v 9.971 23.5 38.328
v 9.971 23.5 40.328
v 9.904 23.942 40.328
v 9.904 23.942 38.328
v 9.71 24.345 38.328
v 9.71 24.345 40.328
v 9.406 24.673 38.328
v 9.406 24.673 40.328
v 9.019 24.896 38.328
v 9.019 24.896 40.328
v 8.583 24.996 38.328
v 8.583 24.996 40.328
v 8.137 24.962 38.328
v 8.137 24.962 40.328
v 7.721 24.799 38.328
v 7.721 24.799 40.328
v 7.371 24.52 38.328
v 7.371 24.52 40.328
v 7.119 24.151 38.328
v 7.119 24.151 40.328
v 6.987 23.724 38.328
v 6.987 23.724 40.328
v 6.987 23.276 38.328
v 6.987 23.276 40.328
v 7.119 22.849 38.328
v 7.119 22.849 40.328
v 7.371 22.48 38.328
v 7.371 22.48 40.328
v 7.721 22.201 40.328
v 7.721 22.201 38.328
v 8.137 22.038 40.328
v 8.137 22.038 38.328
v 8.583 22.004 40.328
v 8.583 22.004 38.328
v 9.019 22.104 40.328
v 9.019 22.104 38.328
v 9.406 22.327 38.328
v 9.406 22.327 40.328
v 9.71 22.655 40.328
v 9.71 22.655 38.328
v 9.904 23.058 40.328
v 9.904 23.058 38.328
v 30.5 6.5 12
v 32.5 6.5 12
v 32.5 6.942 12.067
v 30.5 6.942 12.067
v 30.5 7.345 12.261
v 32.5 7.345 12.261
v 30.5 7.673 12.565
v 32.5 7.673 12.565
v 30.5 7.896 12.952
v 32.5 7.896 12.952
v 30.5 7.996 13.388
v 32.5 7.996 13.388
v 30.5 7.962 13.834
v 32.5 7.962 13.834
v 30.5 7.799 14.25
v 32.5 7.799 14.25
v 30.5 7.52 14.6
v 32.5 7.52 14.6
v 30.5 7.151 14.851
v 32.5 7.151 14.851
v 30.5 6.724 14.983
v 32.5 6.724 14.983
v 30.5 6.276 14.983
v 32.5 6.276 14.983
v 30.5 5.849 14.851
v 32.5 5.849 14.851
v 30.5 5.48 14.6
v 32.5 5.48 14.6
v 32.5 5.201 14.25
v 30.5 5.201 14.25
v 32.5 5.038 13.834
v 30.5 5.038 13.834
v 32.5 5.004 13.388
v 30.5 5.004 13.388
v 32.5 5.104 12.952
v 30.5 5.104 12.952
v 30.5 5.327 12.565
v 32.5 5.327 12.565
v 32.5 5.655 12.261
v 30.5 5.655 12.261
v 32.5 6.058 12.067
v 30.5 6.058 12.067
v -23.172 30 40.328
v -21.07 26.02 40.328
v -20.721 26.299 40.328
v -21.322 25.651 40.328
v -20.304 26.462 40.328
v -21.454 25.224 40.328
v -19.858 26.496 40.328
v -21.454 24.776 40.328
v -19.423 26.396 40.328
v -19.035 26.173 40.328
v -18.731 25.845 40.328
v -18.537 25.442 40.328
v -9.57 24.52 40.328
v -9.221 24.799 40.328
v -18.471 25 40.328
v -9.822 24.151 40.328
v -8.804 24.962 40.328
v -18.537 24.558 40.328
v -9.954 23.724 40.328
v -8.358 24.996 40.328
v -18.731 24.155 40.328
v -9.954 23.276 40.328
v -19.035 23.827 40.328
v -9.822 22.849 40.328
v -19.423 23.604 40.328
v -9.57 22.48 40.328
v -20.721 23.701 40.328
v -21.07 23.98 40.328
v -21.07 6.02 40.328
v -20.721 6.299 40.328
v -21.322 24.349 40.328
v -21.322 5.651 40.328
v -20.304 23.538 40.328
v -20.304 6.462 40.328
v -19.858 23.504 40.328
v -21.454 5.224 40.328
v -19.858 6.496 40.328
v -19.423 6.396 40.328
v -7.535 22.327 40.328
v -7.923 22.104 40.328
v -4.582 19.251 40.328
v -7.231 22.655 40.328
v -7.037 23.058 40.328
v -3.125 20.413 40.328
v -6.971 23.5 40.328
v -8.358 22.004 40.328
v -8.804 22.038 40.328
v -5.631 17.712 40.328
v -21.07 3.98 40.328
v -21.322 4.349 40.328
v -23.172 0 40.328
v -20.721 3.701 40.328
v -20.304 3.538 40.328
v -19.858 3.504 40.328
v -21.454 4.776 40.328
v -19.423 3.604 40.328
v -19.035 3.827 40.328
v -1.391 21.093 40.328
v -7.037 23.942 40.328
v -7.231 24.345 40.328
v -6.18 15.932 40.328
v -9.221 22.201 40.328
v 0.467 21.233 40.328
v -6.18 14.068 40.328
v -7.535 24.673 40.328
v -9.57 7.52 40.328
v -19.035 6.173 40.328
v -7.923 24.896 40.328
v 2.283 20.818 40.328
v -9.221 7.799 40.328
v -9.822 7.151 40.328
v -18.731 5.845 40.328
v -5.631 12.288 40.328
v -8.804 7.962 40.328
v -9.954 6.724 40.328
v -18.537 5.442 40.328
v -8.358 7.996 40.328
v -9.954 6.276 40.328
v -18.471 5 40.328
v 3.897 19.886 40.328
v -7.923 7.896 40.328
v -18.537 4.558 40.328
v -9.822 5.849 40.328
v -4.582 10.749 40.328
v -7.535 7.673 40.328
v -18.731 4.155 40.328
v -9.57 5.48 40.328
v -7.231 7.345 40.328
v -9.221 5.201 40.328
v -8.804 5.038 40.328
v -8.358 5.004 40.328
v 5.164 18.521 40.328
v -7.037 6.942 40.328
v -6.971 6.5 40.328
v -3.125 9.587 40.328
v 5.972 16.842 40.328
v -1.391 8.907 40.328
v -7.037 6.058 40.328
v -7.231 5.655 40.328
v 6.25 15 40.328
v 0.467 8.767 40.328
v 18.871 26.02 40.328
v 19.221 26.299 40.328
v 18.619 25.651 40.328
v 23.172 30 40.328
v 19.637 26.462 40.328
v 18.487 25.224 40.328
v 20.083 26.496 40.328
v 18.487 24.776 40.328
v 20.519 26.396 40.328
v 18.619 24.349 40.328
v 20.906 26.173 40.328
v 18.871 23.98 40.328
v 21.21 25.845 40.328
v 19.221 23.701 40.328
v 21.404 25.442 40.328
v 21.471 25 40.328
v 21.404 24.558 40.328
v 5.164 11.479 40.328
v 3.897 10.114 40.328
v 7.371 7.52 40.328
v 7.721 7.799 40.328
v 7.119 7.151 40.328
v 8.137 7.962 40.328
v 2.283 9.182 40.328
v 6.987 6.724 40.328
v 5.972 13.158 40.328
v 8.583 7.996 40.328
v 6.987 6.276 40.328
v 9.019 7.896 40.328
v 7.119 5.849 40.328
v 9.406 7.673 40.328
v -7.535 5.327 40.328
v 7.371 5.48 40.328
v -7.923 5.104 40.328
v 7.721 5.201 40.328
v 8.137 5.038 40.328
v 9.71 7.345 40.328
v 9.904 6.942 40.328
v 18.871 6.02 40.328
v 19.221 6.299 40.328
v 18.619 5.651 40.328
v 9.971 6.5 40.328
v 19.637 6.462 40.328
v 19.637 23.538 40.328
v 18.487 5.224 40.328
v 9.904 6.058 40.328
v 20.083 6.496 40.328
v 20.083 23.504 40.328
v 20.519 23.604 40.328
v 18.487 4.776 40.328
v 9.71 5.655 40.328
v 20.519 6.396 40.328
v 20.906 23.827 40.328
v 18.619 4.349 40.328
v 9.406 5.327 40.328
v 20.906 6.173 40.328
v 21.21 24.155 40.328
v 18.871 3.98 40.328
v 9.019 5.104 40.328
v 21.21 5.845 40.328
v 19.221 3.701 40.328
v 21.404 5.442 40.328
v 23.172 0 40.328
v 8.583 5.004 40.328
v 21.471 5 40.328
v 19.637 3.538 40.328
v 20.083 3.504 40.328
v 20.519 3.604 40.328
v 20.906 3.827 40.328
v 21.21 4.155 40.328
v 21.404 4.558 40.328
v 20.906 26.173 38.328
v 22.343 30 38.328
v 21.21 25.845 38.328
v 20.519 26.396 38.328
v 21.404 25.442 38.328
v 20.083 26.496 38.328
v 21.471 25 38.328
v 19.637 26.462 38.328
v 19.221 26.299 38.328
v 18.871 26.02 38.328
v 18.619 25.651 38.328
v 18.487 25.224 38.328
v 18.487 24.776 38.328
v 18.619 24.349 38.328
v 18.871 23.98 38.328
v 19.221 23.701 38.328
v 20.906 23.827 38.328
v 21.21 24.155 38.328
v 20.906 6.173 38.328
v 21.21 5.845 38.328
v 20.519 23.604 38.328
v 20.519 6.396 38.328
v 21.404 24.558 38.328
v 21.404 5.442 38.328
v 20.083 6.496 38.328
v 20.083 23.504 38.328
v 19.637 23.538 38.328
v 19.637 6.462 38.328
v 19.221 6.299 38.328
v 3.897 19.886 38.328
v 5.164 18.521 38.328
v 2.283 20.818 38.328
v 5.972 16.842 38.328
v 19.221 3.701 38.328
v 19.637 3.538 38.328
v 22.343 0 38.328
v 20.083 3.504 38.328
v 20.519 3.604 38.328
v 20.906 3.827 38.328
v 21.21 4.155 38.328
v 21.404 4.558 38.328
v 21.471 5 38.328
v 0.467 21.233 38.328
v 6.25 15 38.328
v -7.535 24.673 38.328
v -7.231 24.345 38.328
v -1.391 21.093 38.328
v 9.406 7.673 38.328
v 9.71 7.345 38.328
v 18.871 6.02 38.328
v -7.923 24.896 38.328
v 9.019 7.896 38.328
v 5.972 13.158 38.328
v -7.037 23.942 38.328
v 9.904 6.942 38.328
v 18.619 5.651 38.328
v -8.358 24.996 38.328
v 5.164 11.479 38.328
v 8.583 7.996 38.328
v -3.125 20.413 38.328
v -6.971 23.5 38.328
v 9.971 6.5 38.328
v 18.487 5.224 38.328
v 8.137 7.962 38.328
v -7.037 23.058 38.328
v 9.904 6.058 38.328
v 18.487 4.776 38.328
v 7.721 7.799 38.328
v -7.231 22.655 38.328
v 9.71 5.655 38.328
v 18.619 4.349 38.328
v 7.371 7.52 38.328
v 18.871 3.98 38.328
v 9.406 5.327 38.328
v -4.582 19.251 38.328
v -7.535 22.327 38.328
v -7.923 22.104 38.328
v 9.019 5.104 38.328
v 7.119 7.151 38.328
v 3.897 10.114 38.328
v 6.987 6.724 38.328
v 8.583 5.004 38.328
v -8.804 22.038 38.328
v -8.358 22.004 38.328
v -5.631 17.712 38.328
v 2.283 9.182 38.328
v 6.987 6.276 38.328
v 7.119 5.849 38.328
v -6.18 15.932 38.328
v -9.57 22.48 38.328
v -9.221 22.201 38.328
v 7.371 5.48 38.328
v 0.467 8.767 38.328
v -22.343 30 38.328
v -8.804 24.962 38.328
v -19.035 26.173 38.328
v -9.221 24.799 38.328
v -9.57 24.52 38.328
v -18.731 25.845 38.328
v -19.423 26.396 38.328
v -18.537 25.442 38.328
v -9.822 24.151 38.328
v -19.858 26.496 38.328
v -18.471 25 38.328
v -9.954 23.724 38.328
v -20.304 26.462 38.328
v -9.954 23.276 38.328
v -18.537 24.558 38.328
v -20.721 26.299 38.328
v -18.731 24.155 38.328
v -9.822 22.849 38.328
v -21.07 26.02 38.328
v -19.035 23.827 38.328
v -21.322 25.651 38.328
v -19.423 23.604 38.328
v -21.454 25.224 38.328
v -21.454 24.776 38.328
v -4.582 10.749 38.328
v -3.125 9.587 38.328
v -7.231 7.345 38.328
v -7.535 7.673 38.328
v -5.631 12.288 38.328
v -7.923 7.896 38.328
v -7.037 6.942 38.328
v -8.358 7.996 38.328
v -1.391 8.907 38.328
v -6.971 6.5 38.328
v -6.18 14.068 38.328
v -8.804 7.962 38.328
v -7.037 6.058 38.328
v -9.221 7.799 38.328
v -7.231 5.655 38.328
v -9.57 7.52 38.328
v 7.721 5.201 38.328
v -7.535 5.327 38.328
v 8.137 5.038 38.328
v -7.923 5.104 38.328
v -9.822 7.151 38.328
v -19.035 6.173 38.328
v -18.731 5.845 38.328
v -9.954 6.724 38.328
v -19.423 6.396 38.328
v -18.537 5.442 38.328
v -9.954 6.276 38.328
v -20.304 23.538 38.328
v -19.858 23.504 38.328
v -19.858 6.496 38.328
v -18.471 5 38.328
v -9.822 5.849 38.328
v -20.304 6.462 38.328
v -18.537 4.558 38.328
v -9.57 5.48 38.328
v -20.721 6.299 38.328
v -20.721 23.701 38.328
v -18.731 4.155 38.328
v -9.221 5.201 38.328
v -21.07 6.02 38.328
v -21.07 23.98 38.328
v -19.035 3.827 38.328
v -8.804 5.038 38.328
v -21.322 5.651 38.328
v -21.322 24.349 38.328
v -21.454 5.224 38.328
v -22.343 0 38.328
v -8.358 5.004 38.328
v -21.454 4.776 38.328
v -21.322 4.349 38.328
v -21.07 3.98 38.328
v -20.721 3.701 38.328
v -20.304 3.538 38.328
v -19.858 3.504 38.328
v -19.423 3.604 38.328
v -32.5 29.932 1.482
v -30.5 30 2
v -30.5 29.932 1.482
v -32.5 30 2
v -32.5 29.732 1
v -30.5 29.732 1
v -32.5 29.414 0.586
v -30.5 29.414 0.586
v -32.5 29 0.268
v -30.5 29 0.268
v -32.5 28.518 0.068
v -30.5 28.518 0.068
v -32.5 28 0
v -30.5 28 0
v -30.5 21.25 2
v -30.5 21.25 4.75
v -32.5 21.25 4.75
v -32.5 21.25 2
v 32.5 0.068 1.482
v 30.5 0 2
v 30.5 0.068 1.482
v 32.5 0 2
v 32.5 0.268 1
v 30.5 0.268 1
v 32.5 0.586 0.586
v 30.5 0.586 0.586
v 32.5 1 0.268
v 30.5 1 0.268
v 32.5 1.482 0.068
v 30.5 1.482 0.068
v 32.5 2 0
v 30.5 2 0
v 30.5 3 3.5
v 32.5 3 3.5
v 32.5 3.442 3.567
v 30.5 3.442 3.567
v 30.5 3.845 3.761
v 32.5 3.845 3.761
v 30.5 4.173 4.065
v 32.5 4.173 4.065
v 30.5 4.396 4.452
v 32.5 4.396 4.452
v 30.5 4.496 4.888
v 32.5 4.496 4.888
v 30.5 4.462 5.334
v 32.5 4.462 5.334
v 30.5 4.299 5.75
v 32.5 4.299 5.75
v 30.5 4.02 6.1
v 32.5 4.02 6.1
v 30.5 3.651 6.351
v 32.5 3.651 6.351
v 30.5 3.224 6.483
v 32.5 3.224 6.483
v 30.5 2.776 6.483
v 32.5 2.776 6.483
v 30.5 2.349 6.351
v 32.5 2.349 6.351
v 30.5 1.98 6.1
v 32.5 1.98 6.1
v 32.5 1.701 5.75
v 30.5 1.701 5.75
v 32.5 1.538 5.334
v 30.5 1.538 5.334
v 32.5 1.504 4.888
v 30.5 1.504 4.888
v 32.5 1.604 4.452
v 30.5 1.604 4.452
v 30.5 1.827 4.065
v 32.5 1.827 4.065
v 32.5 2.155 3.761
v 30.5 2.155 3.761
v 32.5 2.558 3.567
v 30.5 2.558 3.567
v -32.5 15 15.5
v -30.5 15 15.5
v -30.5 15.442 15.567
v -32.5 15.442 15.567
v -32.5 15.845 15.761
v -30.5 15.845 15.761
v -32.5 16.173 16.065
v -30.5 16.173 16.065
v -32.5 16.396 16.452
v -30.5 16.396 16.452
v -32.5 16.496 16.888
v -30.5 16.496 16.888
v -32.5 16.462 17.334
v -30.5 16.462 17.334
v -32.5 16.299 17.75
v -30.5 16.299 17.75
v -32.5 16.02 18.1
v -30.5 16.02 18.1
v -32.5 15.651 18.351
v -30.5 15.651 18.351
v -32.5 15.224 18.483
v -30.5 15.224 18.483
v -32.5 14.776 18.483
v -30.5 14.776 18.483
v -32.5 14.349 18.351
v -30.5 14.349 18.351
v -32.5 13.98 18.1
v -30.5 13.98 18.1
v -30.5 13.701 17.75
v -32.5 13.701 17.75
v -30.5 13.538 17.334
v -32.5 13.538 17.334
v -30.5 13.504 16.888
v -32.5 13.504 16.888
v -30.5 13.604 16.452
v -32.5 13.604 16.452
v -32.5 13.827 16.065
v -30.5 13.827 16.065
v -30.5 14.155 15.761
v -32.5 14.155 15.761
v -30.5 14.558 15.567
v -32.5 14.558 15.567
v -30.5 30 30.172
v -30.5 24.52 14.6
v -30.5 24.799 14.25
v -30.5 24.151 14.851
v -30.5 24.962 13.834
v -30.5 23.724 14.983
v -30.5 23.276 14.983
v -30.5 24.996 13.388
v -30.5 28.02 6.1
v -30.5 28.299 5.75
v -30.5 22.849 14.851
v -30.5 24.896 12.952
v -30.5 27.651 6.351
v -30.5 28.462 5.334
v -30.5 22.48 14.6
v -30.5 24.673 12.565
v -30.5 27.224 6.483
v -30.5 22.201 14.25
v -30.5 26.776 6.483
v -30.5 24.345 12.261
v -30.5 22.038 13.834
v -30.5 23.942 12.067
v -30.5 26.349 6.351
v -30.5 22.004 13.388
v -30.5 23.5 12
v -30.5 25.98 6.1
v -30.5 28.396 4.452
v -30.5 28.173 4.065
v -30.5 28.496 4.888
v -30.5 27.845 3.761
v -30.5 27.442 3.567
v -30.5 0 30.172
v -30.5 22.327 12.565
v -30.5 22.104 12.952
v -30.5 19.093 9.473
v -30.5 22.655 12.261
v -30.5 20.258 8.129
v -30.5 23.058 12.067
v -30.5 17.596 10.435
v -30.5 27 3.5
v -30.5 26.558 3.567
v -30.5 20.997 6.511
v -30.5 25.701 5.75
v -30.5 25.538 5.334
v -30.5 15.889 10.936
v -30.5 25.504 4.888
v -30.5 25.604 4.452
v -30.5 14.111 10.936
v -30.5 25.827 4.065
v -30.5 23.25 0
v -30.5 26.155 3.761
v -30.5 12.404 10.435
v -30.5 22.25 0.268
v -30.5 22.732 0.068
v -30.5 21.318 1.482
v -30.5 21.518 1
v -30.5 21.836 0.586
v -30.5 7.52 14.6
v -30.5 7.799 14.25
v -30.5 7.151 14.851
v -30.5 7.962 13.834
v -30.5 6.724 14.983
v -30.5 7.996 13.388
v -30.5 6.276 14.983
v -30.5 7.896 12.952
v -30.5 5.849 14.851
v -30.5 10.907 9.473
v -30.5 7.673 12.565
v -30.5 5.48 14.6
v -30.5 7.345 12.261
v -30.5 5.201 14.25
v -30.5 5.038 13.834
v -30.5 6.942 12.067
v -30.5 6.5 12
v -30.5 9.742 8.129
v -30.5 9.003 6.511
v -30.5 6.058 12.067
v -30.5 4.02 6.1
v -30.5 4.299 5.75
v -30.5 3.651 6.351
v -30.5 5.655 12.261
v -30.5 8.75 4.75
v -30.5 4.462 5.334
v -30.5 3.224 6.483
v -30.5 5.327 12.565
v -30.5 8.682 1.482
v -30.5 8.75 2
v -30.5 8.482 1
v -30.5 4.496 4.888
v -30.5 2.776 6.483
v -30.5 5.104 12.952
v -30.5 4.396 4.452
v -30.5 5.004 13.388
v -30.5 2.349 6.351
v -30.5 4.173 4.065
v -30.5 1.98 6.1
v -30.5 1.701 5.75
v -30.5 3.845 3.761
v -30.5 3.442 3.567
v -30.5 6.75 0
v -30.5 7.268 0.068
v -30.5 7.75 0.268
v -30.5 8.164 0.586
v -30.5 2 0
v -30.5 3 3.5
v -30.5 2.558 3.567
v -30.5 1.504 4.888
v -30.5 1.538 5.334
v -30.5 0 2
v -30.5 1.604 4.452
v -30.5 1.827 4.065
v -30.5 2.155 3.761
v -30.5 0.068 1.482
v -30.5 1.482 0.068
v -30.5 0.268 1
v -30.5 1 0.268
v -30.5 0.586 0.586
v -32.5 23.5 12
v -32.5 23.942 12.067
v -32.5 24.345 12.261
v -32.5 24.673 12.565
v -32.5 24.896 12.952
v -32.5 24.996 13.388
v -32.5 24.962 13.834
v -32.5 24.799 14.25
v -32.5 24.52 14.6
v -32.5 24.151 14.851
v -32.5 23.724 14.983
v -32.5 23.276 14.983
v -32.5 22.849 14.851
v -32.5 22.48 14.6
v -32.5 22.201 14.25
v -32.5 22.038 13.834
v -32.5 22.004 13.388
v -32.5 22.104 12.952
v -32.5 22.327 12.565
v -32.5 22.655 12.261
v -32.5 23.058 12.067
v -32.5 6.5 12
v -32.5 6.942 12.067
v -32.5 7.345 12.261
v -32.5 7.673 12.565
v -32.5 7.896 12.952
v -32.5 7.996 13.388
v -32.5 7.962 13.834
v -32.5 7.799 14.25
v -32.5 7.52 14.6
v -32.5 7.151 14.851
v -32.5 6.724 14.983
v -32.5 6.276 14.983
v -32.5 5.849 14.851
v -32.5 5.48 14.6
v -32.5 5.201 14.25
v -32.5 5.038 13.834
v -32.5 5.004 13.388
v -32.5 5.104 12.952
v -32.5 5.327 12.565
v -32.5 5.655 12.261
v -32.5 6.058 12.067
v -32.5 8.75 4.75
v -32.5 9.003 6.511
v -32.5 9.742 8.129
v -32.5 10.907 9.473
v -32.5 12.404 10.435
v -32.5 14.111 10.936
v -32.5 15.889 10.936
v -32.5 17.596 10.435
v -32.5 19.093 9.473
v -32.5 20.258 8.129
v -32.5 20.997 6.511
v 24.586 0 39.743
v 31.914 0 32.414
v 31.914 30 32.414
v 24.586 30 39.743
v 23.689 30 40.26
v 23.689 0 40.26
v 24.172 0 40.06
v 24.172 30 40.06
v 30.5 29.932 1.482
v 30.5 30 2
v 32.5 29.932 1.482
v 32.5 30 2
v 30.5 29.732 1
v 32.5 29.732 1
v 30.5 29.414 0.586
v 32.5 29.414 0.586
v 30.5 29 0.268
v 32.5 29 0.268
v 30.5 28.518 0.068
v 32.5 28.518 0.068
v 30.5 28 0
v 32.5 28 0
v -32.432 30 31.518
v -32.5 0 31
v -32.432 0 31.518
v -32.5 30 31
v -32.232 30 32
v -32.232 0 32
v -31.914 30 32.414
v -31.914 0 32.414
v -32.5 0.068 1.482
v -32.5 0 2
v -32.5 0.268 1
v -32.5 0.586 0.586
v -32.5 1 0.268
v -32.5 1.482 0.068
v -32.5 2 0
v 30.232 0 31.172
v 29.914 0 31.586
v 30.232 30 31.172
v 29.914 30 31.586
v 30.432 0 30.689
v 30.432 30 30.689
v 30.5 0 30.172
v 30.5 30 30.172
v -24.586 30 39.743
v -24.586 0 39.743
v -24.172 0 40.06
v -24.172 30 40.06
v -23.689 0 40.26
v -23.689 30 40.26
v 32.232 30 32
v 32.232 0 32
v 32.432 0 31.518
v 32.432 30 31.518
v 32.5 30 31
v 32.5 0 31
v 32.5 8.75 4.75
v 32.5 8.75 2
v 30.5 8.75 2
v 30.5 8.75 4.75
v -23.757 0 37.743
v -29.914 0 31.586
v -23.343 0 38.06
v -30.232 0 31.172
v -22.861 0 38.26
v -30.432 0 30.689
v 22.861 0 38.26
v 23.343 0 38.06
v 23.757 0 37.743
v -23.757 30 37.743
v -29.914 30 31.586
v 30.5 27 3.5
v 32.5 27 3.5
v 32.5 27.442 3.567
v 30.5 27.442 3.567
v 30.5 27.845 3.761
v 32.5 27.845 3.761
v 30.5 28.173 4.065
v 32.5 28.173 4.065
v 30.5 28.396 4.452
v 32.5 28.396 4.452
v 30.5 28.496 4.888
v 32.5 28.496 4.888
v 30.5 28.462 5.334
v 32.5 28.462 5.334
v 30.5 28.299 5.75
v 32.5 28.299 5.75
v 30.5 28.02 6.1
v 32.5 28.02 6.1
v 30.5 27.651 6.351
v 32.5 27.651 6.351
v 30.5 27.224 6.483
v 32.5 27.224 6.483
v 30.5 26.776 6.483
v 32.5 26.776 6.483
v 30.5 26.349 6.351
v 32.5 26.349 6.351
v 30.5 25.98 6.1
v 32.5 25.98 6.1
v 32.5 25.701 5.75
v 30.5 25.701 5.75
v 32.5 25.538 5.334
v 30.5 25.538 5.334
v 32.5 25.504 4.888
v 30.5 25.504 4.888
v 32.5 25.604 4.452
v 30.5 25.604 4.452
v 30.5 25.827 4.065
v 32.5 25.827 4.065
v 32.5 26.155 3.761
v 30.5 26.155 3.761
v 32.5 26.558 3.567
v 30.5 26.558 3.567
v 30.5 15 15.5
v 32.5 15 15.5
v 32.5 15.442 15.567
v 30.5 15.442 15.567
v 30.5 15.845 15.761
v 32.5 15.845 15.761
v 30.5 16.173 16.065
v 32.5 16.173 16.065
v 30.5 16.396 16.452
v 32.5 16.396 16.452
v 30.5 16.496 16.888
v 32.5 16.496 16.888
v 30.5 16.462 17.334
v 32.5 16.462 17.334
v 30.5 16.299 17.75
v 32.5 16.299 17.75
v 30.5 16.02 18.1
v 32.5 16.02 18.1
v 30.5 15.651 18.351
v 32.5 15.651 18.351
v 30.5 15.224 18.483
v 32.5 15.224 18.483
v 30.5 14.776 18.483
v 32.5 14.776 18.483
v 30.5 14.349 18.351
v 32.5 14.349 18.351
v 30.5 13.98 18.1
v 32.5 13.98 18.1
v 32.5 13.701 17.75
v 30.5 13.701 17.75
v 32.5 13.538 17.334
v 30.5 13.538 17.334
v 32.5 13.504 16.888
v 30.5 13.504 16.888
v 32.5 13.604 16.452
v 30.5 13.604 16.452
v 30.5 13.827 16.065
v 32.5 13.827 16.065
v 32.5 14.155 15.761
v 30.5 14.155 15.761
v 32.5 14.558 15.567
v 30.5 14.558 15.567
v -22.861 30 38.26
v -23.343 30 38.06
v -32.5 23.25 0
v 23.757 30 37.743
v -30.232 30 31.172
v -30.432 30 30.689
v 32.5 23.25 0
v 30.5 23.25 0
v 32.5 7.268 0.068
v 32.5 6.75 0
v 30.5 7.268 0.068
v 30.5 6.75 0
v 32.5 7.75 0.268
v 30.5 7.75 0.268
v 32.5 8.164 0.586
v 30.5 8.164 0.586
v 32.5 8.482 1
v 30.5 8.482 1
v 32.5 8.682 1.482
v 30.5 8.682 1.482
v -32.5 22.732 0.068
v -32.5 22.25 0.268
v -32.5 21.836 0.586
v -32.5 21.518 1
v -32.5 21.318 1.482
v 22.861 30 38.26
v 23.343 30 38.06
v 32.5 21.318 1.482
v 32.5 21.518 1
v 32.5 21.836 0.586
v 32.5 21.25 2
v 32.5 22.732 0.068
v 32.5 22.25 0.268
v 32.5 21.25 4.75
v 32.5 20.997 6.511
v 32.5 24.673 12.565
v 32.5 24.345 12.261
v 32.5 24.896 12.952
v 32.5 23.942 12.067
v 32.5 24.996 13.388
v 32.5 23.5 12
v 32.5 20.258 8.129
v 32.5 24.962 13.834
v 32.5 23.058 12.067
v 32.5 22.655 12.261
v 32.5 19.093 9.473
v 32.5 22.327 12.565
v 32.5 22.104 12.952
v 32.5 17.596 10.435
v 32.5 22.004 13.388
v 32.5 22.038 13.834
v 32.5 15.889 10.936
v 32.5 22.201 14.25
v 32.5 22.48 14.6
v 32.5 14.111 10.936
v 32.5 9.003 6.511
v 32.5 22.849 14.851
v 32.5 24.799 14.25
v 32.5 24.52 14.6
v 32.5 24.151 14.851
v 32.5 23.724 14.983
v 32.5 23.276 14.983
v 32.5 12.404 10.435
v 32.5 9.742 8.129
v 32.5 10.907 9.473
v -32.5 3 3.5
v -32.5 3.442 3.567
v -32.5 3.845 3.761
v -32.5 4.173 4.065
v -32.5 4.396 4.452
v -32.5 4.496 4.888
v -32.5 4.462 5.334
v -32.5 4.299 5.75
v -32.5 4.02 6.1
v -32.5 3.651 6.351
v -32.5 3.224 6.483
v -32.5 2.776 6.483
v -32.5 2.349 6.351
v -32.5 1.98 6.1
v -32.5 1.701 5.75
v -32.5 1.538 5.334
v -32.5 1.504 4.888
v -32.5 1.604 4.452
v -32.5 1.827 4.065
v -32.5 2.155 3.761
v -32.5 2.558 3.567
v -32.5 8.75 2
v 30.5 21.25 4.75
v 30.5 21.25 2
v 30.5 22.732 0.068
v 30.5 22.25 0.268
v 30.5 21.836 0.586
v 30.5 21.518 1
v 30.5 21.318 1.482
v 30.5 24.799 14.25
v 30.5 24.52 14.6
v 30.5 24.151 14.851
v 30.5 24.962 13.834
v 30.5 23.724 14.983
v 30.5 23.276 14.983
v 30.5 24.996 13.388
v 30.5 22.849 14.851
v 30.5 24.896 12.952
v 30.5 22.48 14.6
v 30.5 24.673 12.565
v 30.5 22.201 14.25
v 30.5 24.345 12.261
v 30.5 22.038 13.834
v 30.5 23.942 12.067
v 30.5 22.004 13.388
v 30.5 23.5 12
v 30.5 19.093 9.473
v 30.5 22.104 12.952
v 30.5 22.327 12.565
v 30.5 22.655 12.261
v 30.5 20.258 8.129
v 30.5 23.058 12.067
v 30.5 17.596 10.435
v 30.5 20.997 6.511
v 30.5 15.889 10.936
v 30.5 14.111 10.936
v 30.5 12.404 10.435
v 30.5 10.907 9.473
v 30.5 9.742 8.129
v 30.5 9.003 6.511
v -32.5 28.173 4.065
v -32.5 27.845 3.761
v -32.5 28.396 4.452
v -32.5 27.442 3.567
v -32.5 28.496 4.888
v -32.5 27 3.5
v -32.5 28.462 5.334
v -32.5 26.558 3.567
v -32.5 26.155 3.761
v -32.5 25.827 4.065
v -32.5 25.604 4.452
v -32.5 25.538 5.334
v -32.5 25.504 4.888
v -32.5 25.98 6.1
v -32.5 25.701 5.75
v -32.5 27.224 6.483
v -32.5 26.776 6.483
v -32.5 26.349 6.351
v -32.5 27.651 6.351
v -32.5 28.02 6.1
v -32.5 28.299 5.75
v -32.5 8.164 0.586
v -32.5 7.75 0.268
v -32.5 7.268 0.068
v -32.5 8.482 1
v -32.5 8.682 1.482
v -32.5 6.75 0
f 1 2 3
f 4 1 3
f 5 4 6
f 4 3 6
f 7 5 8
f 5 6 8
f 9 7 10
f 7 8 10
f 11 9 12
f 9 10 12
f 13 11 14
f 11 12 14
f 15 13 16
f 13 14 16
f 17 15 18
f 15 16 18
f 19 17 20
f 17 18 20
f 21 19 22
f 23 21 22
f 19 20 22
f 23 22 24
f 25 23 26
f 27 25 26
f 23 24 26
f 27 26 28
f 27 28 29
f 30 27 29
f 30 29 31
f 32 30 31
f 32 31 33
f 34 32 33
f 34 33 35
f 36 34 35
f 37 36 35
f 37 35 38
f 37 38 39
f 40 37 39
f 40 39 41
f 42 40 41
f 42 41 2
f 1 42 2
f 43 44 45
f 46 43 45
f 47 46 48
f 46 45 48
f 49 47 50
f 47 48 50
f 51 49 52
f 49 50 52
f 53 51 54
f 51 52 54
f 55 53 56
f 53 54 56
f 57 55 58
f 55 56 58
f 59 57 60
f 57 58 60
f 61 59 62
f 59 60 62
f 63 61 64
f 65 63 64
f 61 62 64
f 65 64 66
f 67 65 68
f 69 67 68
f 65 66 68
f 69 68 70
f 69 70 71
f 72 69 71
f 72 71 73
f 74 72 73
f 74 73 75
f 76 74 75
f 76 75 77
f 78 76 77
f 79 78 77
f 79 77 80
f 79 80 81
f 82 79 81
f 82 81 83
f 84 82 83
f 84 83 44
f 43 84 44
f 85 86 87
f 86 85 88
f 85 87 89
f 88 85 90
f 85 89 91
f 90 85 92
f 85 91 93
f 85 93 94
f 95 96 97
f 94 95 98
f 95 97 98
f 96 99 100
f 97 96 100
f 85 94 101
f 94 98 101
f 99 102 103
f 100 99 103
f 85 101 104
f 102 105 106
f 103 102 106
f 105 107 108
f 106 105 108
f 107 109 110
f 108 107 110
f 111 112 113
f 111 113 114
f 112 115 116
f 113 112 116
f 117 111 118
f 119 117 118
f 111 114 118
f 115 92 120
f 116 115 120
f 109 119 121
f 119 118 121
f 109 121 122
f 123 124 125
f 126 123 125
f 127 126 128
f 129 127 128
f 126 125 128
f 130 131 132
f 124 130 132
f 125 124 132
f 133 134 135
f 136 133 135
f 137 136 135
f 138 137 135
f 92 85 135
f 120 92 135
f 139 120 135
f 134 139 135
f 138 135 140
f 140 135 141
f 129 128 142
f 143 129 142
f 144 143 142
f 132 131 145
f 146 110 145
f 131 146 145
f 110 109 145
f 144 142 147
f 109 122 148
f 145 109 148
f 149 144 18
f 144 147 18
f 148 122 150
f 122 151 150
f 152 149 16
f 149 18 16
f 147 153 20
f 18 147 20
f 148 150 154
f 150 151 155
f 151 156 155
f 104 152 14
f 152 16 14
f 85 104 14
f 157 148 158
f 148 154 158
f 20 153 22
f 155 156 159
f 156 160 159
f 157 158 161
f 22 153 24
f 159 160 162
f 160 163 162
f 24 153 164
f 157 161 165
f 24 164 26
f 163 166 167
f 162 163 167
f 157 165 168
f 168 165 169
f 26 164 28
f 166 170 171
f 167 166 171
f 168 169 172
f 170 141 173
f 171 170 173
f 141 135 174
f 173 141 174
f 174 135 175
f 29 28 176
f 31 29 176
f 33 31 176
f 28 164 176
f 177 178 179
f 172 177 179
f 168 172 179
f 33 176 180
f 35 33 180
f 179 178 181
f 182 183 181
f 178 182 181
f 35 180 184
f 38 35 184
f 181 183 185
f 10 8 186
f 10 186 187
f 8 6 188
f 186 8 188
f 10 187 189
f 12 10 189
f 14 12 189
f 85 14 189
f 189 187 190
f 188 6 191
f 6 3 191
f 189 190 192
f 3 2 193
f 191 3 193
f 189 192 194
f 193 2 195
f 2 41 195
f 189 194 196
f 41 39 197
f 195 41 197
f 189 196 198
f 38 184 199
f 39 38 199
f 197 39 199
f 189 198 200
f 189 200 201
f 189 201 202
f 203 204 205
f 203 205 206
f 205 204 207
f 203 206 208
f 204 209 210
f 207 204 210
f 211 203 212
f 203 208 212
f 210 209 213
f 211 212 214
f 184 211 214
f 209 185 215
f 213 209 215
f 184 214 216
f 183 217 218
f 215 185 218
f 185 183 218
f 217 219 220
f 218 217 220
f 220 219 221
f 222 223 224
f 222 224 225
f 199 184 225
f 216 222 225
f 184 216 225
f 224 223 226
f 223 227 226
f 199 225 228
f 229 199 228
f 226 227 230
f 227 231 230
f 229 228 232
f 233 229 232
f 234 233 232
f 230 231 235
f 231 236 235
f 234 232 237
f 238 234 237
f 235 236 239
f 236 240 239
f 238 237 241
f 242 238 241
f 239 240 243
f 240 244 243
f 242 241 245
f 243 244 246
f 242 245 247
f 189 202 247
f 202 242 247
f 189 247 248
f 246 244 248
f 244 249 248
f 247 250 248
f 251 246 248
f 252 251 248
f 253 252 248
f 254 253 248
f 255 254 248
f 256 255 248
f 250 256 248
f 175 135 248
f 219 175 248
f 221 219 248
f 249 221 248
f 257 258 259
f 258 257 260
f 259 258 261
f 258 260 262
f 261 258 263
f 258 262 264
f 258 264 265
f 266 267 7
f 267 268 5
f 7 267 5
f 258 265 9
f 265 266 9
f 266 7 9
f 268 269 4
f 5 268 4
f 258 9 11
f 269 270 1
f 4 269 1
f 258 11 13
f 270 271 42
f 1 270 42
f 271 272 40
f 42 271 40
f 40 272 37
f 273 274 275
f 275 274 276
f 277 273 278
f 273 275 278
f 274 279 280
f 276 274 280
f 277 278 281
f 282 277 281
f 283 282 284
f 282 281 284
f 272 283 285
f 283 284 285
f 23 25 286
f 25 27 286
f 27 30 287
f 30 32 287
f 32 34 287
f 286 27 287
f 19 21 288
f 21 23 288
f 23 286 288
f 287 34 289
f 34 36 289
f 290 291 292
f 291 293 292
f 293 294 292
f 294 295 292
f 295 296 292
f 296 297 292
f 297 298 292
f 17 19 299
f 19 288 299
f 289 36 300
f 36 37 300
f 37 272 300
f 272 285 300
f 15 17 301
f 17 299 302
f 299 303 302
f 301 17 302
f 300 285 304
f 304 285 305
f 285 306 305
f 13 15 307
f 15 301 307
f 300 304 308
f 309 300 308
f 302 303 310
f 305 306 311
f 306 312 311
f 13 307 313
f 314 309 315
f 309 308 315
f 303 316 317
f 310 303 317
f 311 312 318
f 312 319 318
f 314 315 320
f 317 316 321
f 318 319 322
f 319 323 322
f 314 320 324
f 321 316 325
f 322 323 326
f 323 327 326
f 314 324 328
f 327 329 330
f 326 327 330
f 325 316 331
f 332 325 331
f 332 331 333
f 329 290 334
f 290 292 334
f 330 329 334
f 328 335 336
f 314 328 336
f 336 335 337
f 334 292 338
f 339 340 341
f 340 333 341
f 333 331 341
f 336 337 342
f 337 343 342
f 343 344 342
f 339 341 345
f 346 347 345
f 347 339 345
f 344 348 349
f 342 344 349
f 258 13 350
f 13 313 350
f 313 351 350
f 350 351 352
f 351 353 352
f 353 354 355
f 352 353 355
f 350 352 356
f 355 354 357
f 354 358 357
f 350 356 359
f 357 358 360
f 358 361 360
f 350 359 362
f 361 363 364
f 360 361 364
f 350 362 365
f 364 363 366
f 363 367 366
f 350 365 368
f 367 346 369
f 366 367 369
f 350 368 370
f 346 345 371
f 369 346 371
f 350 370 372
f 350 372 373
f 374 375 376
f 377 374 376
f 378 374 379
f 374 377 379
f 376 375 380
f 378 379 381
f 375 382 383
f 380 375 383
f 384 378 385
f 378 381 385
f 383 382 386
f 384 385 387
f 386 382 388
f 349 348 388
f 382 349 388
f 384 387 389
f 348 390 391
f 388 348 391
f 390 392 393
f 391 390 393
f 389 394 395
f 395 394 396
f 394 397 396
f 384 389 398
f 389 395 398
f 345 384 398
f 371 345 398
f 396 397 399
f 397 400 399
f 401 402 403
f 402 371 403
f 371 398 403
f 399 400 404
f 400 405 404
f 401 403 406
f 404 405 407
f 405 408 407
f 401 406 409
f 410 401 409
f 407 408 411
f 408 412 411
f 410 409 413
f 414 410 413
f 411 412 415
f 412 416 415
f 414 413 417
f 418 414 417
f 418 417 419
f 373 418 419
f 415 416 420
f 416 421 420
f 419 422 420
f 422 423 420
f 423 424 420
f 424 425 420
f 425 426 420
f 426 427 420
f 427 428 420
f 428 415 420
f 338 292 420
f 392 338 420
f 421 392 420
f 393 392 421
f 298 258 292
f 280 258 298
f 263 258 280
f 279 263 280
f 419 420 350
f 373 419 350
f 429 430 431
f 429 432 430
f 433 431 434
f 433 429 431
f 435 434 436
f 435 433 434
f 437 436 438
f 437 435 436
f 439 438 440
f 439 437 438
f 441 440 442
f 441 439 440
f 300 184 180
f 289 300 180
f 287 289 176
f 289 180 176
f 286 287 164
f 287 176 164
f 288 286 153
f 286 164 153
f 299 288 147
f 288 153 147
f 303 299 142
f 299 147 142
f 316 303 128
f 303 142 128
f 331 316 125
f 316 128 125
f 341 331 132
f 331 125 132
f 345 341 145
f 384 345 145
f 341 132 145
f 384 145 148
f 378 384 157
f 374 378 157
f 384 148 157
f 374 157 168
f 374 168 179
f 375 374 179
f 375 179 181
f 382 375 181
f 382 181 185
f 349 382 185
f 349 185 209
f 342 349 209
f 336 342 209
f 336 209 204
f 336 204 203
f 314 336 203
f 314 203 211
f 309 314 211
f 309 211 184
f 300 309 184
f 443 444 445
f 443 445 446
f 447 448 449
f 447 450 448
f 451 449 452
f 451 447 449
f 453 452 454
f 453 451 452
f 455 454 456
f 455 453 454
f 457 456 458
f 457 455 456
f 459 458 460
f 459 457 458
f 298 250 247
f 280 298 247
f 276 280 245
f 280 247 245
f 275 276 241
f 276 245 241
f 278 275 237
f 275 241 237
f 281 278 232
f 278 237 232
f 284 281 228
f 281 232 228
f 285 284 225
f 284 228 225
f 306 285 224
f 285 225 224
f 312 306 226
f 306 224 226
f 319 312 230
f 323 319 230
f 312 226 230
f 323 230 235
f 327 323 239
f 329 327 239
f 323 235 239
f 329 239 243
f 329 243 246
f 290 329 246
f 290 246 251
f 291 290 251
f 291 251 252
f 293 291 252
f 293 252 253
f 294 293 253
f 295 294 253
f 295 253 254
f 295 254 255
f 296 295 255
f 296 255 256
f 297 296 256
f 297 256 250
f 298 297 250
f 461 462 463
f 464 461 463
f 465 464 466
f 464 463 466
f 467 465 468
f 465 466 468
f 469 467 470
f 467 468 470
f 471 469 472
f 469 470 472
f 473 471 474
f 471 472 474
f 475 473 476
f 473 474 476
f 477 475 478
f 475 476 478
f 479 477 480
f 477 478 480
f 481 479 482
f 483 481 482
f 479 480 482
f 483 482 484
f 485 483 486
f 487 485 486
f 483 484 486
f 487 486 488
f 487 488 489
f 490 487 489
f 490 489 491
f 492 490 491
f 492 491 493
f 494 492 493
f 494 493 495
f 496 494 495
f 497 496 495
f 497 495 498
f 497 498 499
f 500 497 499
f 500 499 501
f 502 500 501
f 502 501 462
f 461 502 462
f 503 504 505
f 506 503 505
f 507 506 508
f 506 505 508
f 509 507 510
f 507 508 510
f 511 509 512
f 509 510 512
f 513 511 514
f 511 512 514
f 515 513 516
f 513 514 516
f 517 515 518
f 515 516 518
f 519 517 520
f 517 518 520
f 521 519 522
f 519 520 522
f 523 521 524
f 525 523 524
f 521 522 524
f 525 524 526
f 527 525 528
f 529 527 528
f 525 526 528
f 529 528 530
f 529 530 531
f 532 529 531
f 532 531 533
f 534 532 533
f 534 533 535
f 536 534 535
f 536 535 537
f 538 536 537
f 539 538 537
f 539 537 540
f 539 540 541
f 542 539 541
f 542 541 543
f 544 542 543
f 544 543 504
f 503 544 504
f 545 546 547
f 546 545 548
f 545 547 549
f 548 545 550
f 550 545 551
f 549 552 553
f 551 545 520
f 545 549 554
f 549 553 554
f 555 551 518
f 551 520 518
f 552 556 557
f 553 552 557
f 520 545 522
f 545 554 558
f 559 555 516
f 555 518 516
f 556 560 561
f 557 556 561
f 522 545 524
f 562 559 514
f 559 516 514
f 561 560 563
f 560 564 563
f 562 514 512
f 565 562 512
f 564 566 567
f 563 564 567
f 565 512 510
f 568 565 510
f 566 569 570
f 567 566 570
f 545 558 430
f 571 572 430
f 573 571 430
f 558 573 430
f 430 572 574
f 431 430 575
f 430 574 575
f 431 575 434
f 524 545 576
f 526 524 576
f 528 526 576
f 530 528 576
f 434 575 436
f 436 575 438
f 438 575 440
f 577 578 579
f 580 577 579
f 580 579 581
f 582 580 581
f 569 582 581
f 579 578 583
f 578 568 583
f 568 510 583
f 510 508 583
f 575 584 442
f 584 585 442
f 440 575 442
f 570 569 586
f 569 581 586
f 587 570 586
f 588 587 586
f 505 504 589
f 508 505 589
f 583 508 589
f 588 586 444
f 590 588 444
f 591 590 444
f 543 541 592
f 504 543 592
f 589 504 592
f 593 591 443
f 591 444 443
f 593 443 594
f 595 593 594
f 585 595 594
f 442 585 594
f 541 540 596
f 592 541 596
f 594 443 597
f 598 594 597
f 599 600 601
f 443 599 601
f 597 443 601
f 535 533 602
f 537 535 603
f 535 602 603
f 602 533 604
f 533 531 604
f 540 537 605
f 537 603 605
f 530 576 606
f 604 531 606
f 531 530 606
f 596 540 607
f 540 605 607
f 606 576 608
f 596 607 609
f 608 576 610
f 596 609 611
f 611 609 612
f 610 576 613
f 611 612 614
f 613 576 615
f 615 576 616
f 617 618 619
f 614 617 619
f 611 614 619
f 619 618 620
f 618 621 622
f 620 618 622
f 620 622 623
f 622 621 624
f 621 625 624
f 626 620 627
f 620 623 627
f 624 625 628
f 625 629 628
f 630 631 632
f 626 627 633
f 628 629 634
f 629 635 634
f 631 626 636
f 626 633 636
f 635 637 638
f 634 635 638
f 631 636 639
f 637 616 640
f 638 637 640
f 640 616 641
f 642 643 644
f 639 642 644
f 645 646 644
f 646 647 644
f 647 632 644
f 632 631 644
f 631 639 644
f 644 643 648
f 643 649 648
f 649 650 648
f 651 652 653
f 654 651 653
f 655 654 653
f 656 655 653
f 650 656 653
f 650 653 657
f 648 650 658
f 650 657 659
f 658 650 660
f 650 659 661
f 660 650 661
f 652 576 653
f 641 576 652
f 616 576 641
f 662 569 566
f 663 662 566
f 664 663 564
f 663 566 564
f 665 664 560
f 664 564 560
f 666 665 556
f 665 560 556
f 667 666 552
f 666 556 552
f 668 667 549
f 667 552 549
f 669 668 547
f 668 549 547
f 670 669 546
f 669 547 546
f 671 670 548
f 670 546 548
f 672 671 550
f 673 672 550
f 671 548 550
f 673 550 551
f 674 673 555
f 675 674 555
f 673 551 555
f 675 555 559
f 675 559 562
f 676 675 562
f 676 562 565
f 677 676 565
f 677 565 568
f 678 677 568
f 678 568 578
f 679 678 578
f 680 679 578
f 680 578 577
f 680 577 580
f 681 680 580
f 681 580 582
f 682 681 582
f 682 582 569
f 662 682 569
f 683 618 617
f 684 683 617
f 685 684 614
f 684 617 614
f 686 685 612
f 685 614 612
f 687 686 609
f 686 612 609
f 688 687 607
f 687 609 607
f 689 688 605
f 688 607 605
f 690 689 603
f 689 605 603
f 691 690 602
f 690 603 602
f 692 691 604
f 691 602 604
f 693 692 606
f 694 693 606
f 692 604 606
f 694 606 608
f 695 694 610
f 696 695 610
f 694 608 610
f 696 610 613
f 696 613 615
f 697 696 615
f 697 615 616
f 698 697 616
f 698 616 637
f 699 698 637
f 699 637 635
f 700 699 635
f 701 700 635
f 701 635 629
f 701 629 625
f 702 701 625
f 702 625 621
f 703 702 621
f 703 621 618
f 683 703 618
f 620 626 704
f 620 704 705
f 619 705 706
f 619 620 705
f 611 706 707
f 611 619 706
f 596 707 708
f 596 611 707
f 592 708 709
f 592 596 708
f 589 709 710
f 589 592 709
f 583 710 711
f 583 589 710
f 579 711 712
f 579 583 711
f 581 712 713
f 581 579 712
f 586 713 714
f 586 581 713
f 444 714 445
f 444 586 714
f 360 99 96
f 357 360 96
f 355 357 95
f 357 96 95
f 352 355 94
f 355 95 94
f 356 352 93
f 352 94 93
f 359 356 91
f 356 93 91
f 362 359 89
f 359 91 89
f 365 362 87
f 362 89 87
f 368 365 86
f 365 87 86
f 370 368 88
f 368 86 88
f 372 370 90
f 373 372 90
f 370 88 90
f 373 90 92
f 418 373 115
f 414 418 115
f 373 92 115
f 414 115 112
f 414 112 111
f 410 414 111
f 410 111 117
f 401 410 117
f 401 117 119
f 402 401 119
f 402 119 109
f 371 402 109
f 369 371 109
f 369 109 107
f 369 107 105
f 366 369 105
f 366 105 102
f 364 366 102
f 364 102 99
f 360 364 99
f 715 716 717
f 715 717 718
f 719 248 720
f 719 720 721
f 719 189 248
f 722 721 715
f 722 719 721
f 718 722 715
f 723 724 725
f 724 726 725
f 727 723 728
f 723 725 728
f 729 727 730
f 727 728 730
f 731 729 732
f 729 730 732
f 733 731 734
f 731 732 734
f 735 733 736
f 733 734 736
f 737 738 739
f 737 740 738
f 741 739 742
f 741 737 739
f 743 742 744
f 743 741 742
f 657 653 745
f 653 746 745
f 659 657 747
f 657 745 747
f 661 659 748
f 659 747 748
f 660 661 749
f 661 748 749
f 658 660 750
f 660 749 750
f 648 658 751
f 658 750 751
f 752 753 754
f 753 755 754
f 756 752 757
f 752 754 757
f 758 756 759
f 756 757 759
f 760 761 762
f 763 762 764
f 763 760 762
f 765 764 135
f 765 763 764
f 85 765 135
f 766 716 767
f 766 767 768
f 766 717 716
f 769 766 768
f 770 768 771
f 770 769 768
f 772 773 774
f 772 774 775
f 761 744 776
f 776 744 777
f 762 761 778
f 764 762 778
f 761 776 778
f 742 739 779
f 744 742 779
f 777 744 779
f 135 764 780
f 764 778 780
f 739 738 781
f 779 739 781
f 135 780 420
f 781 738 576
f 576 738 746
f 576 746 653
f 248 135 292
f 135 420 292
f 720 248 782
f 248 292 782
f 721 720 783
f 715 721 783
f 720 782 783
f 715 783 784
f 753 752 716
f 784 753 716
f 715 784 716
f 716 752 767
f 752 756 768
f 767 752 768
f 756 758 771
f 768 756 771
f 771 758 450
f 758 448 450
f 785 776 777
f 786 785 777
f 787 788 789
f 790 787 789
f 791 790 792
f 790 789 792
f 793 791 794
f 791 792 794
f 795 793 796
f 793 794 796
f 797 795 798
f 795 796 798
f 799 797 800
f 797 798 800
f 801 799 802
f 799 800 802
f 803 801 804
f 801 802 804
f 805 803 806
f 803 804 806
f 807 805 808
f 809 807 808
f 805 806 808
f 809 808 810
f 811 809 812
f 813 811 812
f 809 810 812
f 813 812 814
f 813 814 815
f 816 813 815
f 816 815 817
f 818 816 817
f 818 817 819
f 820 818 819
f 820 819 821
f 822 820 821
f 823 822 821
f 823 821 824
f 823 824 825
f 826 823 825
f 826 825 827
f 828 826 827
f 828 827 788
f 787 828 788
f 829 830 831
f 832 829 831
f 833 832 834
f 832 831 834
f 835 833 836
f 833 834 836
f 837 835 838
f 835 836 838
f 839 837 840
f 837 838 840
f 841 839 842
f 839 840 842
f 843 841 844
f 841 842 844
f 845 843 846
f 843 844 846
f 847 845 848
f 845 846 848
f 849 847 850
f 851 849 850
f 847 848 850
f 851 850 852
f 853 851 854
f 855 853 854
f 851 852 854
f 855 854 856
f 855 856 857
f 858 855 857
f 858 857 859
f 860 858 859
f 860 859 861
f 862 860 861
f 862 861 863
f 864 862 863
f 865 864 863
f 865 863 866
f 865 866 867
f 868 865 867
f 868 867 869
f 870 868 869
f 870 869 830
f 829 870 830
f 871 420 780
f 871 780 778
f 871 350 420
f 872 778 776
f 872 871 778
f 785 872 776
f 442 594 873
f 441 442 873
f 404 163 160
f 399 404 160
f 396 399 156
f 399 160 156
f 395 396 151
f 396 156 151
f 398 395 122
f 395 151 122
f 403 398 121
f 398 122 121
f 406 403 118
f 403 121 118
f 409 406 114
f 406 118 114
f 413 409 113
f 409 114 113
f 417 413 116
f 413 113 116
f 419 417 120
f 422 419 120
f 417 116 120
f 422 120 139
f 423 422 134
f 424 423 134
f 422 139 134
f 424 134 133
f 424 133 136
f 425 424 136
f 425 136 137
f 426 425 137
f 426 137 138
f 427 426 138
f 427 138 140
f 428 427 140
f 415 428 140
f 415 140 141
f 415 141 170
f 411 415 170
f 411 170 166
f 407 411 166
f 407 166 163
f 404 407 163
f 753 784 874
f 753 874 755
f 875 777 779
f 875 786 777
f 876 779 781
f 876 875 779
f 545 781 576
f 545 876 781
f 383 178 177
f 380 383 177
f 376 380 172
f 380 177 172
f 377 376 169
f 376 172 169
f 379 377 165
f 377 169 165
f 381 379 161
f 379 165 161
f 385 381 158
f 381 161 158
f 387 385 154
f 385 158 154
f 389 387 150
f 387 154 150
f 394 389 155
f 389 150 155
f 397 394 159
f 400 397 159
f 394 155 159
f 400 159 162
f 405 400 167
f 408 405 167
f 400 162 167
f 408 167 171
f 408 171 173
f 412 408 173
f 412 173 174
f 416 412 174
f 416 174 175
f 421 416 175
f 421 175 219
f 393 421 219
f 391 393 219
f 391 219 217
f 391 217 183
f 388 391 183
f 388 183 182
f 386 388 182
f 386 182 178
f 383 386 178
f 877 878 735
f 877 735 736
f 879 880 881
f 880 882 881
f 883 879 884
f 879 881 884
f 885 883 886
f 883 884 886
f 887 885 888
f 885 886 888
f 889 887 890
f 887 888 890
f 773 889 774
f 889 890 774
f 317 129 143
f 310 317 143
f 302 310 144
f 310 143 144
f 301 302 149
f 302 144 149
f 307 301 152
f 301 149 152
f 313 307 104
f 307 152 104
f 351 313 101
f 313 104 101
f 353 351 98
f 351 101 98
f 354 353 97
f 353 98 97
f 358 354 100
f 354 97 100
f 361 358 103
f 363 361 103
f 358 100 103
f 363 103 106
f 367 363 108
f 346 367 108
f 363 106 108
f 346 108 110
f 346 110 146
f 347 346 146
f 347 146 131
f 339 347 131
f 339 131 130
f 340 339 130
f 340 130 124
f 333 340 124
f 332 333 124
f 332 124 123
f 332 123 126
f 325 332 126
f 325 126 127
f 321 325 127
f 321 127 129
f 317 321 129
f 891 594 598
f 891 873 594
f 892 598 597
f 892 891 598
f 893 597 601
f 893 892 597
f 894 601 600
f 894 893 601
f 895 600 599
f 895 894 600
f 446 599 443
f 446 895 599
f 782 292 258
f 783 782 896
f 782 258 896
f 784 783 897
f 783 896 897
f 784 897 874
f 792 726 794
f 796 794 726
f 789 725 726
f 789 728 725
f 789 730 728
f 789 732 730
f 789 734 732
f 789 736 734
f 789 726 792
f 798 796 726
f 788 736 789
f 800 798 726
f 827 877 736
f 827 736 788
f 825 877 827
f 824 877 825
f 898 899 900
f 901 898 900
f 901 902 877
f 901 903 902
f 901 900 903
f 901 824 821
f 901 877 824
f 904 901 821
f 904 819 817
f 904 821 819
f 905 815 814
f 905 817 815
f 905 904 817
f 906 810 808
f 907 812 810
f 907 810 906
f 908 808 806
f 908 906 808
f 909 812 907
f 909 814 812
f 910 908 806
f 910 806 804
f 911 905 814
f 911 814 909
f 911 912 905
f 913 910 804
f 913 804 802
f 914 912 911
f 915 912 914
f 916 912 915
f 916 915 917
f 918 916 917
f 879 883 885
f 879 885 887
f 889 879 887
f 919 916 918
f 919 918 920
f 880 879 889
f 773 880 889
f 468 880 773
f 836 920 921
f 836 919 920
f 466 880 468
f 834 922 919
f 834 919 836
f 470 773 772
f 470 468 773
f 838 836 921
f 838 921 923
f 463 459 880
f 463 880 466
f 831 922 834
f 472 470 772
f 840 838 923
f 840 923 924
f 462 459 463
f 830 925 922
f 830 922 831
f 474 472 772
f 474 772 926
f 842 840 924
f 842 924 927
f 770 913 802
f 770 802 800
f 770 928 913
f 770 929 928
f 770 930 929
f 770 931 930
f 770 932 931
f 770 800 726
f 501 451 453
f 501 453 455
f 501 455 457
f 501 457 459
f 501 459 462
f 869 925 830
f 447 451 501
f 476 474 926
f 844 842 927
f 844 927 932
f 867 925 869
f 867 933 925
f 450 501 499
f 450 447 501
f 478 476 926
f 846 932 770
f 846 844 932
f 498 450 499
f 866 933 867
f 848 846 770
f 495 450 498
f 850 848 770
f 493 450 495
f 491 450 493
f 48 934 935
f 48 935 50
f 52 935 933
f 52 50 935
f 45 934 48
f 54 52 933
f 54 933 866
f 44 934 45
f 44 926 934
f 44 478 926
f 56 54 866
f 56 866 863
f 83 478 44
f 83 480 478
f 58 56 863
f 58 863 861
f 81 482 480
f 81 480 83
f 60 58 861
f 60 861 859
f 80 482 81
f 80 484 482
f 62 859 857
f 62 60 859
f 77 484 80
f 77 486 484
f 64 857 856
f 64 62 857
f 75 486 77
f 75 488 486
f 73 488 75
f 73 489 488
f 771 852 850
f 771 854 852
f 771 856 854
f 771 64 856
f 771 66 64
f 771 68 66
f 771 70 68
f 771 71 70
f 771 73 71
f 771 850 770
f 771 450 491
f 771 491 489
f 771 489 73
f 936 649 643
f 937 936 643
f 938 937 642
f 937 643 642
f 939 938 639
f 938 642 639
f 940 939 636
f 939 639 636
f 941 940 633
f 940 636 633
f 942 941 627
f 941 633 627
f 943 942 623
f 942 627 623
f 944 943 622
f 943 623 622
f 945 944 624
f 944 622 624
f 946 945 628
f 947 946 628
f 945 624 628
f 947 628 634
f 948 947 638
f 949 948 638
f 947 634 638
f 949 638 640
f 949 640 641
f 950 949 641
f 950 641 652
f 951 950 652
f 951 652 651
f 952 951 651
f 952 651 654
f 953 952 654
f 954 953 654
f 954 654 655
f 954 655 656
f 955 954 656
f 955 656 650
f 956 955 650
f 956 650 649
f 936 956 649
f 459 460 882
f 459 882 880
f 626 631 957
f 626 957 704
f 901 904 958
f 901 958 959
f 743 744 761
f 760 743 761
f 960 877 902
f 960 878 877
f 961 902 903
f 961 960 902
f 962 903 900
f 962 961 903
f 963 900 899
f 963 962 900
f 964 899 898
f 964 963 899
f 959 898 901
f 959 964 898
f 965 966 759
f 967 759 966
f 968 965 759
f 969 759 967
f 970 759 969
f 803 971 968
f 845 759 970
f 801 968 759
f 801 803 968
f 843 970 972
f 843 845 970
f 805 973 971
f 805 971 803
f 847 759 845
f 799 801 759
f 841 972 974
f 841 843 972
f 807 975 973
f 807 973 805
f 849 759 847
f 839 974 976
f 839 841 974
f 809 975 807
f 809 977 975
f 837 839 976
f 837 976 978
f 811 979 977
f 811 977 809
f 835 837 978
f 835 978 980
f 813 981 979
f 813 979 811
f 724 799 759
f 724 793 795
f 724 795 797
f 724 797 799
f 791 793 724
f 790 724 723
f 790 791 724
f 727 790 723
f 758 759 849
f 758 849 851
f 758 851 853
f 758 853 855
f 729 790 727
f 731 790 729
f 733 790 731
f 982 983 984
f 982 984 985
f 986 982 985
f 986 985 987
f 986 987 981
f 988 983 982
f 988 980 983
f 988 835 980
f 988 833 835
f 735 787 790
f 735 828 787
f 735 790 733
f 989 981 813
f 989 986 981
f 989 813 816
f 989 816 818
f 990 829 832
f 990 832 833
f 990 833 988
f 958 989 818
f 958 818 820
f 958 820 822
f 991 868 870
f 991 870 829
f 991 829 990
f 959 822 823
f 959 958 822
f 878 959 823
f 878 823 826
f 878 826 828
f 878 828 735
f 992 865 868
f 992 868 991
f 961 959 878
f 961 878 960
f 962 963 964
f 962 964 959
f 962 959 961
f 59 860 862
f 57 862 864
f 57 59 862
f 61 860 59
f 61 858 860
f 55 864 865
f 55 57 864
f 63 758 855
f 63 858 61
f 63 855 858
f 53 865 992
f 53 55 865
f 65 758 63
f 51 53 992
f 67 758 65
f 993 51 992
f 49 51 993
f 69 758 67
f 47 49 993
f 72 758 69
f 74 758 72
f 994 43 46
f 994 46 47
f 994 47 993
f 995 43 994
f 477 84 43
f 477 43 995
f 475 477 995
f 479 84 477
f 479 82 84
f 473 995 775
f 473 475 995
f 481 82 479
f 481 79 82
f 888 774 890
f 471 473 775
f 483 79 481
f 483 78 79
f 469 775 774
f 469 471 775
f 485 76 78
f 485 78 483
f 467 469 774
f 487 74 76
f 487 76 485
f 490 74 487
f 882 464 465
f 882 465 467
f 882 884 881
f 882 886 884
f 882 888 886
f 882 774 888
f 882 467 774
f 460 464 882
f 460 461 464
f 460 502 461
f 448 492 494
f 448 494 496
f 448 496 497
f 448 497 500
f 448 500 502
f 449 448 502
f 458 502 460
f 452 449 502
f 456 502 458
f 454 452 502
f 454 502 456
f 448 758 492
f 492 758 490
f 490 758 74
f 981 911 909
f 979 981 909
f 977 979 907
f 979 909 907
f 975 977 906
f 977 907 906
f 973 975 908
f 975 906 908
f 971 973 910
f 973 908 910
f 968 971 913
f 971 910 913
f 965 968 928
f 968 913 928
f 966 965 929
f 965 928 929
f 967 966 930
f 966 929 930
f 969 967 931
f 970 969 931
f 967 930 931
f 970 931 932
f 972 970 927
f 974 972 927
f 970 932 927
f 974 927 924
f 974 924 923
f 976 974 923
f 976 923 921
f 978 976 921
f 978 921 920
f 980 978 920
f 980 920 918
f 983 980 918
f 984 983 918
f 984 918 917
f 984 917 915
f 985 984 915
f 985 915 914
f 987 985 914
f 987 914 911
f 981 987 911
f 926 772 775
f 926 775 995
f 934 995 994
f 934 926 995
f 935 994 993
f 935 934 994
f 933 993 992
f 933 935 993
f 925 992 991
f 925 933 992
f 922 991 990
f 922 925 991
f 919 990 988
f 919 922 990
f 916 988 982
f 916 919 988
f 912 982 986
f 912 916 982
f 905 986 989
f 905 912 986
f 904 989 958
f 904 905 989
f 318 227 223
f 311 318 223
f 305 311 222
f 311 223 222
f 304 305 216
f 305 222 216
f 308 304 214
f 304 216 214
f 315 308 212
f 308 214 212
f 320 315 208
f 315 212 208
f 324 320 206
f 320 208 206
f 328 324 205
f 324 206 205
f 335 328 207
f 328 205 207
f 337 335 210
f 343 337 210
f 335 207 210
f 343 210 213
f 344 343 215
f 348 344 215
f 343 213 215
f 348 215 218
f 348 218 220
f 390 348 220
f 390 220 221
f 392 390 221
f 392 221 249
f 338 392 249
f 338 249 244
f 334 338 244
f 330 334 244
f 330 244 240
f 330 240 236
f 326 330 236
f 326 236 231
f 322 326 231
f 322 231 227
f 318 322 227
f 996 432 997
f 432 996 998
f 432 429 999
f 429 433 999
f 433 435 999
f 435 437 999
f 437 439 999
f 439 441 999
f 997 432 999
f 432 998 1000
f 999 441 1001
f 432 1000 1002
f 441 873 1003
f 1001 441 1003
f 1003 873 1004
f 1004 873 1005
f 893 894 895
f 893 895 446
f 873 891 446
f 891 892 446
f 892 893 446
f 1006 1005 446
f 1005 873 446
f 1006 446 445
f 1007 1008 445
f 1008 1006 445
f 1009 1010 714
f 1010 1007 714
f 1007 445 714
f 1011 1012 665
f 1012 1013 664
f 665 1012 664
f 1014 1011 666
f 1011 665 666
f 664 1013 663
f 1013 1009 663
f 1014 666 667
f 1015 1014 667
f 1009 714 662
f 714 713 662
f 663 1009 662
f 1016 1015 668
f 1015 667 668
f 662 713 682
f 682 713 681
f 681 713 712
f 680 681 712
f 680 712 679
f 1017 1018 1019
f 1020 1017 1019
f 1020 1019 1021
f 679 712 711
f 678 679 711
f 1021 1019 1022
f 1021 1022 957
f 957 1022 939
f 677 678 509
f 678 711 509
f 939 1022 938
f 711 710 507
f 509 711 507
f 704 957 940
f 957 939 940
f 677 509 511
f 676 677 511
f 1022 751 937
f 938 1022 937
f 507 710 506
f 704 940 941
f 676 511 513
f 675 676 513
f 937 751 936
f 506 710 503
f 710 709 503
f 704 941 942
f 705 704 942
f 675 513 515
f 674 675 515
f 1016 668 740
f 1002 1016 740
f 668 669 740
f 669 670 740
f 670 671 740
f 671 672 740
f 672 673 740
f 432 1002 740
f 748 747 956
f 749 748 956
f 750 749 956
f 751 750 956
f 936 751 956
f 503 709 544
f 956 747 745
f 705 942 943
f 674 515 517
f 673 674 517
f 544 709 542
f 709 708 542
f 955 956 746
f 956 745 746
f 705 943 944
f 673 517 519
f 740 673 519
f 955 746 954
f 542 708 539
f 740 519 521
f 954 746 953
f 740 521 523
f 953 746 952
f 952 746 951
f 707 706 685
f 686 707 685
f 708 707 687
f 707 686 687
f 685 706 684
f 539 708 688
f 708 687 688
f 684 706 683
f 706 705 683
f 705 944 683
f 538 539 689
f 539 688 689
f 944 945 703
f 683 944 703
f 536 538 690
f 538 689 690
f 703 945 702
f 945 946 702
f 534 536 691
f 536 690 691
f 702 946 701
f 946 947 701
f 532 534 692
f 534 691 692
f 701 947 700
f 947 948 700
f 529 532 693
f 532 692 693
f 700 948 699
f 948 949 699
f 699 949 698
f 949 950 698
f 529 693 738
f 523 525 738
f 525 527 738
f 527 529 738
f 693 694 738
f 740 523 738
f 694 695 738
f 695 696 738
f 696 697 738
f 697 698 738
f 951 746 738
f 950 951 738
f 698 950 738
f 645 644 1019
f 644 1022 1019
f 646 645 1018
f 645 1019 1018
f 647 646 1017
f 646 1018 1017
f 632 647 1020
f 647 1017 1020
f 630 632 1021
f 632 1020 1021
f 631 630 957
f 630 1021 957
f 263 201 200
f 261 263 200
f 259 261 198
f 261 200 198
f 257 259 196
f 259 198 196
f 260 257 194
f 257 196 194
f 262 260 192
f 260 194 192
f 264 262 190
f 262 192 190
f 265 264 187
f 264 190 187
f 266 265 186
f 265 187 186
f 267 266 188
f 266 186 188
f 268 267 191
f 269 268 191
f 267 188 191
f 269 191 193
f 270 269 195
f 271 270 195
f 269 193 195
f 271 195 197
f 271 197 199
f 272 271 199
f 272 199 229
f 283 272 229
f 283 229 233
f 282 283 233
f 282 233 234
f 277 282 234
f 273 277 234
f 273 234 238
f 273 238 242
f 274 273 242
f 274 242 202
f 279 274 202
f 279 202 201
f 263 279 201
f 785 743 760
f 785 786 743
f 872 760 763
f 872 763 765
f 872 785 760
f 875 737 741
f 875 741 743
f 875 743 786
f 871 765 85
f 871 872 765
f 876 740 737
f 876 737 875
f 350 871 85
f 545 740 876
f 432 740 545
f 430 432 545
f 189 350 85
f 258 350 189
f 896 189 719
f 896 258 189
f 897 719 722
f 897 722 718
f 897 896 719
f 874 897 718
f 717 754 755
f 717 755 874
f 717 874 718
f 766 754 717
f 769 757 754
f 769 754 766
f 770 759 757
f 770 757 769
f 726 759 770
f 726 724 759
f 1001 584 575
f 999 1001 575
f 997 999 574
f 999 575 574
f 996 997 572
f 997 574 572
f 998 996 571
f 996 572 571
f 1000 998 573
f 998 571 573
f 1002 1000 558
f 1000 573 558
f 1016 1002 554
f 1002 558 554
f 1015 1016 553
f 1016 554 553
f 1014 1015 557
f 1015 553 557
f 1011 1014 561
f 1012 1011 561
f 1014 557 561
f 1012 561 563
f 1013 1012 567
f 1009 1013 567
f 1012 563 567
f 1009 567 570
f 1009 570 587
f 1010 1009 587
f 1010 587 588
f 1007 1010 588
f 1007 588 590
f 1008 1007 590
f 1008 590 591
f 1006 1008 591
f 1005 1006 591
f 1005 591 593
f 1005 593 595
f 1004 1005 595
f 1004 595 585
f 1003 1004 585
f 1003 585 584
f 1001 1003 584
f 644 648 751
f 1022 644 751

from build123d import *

# Parameters (mm, degrees)
BOSS_EXTRUDE2_DEPTH = 30
SKETCH2_R           = 1.5
CUT_EXTRUDE1_DEPTH  = 66
SKETCH3_R           = 6.25
SKETCH3_R_2         = 1.5
CUT_EXTRUDE2_DEPTH  = 10
FILLET1_R           = 2


with BuildPart() as part:
    # Sketch1 → Boss-Extrude2 (new body)
    with BuildSketch(Plane(origin=(0, 0, 0), x_dir=(1, 0, 0), z_dir=(0, 1, 0))):
        Polygon((0, -38.328427125), (23.171572875, -38.328427125), (30.5, -31), (30.5, 0), (32.5, 0), (32.5, -31.828427125), (24, -40.328427125), (0, -40.328427125), align=None)
    boss_extrude2 = extrude(amount=BOSS_EXTRUDE2_DEPTH)

    # Mirror1: Boss-Extrude2 across plane
    add(boss_extrude2.mirror(Plane(origin=(0, 0, 0), x_dir=(0, 0, 1), z_dir=(1, 0, 0))))

    # Sketch2 → Cut-Extrude1 (cut, through all)
    with BuildSketch(Plane(origin=(32.5, 0, 0), x_dir=(0, 0, -1), z_dir=(1, 0, 0))):
        with Locations((-17, 15)):
            Circle(SKETCH2_R)
        with Locations((-5, 3)):
            Circle(SKETCH2_R)
        with Locations((-13.5, 6.5)):
            Circle(SKETCH2_R)
        with Locations((-13.5, 23.5)):
            Circle(SKETCH2_R)
        with Locations((-5, 27)):
            Circle(SKETCH2_R)
        with BuildLine():
            Line((-4.75, 21.25), (0, 21.25))
            Line((0, 21.25), (0, 8.75))
            Line((0, 8.75), (-4.75, 8.75))
            ThreePointArc((-4.75, 8.75), (-11, 15), (-4.75, 21.25))
        make_face()
    extrude(amount=-CUT_EXTRUDE1_DEPTH, mode=Mode.SUBTRACT)

    # Sketch3 → Cut-Extrude2 (cut)
    with BuildSketch(Plane.XY.offset(40.328427125)):
        with Locations((0, 15)):
            Circle(SKETCH3_R)
        with Locations((8.470537173, 6.5)):
            Circle(SKETCH3_R_2)
        with Locations((8.470537173, 23.5)):
            Circle(SKETCH3_R_2)
        with Locations((19.970537173, 5)):
            Circle(SKETCH3_R_2)
        with Locations((19.970537173, 25)):
            Circle(SKETCH3_R_2)
        with Locations((-19.970537173, 5)):
            Circle(SKETCH3_R_2)
        with Locations((-8.470537173, 6.5)):
            Circle(SKETCH3_R_2)
        with Locations((-19.970537173, 25)):
            Circle(SKETCH3_R_2)
        with Locations((-8.470537173, 23.5)):
            Circle(SKETCH3_R_2)
    extrude(amount=-CUT_EXTRUDE2_DEPTH, mode=Mode.SUBTRACT)

    # Fillet1
    fillet1_edges = [part.edges().sort_by_distance(p)[0] for p in [
        (31.5, 0, 0),
        (32.5, 15, 31.828427125),
        (24, 15, 40.328427125),
        (23.171572875, 15, 38.328427125),
        (30.5, 15, 31),
        (-31.5, 30, 0),
        (-32.5, 15, 31.828427125),
        (-24, 15, 40.328427125),
        (-23.171572875, 15, 38.328427125),
        (-30.5, 15, 31),
        (-31.5, 0, 0),
        (31.5, 30, 0),
        (31.5, 21.25, 0),
        (31.5, 8.75, 0),
        (-31.5, 21.25, 0),
        (-31.5, 8.75, 0),
    ]]
    fillet(fillet1_edges, radius=FILLET1_R)


solid = part.part
